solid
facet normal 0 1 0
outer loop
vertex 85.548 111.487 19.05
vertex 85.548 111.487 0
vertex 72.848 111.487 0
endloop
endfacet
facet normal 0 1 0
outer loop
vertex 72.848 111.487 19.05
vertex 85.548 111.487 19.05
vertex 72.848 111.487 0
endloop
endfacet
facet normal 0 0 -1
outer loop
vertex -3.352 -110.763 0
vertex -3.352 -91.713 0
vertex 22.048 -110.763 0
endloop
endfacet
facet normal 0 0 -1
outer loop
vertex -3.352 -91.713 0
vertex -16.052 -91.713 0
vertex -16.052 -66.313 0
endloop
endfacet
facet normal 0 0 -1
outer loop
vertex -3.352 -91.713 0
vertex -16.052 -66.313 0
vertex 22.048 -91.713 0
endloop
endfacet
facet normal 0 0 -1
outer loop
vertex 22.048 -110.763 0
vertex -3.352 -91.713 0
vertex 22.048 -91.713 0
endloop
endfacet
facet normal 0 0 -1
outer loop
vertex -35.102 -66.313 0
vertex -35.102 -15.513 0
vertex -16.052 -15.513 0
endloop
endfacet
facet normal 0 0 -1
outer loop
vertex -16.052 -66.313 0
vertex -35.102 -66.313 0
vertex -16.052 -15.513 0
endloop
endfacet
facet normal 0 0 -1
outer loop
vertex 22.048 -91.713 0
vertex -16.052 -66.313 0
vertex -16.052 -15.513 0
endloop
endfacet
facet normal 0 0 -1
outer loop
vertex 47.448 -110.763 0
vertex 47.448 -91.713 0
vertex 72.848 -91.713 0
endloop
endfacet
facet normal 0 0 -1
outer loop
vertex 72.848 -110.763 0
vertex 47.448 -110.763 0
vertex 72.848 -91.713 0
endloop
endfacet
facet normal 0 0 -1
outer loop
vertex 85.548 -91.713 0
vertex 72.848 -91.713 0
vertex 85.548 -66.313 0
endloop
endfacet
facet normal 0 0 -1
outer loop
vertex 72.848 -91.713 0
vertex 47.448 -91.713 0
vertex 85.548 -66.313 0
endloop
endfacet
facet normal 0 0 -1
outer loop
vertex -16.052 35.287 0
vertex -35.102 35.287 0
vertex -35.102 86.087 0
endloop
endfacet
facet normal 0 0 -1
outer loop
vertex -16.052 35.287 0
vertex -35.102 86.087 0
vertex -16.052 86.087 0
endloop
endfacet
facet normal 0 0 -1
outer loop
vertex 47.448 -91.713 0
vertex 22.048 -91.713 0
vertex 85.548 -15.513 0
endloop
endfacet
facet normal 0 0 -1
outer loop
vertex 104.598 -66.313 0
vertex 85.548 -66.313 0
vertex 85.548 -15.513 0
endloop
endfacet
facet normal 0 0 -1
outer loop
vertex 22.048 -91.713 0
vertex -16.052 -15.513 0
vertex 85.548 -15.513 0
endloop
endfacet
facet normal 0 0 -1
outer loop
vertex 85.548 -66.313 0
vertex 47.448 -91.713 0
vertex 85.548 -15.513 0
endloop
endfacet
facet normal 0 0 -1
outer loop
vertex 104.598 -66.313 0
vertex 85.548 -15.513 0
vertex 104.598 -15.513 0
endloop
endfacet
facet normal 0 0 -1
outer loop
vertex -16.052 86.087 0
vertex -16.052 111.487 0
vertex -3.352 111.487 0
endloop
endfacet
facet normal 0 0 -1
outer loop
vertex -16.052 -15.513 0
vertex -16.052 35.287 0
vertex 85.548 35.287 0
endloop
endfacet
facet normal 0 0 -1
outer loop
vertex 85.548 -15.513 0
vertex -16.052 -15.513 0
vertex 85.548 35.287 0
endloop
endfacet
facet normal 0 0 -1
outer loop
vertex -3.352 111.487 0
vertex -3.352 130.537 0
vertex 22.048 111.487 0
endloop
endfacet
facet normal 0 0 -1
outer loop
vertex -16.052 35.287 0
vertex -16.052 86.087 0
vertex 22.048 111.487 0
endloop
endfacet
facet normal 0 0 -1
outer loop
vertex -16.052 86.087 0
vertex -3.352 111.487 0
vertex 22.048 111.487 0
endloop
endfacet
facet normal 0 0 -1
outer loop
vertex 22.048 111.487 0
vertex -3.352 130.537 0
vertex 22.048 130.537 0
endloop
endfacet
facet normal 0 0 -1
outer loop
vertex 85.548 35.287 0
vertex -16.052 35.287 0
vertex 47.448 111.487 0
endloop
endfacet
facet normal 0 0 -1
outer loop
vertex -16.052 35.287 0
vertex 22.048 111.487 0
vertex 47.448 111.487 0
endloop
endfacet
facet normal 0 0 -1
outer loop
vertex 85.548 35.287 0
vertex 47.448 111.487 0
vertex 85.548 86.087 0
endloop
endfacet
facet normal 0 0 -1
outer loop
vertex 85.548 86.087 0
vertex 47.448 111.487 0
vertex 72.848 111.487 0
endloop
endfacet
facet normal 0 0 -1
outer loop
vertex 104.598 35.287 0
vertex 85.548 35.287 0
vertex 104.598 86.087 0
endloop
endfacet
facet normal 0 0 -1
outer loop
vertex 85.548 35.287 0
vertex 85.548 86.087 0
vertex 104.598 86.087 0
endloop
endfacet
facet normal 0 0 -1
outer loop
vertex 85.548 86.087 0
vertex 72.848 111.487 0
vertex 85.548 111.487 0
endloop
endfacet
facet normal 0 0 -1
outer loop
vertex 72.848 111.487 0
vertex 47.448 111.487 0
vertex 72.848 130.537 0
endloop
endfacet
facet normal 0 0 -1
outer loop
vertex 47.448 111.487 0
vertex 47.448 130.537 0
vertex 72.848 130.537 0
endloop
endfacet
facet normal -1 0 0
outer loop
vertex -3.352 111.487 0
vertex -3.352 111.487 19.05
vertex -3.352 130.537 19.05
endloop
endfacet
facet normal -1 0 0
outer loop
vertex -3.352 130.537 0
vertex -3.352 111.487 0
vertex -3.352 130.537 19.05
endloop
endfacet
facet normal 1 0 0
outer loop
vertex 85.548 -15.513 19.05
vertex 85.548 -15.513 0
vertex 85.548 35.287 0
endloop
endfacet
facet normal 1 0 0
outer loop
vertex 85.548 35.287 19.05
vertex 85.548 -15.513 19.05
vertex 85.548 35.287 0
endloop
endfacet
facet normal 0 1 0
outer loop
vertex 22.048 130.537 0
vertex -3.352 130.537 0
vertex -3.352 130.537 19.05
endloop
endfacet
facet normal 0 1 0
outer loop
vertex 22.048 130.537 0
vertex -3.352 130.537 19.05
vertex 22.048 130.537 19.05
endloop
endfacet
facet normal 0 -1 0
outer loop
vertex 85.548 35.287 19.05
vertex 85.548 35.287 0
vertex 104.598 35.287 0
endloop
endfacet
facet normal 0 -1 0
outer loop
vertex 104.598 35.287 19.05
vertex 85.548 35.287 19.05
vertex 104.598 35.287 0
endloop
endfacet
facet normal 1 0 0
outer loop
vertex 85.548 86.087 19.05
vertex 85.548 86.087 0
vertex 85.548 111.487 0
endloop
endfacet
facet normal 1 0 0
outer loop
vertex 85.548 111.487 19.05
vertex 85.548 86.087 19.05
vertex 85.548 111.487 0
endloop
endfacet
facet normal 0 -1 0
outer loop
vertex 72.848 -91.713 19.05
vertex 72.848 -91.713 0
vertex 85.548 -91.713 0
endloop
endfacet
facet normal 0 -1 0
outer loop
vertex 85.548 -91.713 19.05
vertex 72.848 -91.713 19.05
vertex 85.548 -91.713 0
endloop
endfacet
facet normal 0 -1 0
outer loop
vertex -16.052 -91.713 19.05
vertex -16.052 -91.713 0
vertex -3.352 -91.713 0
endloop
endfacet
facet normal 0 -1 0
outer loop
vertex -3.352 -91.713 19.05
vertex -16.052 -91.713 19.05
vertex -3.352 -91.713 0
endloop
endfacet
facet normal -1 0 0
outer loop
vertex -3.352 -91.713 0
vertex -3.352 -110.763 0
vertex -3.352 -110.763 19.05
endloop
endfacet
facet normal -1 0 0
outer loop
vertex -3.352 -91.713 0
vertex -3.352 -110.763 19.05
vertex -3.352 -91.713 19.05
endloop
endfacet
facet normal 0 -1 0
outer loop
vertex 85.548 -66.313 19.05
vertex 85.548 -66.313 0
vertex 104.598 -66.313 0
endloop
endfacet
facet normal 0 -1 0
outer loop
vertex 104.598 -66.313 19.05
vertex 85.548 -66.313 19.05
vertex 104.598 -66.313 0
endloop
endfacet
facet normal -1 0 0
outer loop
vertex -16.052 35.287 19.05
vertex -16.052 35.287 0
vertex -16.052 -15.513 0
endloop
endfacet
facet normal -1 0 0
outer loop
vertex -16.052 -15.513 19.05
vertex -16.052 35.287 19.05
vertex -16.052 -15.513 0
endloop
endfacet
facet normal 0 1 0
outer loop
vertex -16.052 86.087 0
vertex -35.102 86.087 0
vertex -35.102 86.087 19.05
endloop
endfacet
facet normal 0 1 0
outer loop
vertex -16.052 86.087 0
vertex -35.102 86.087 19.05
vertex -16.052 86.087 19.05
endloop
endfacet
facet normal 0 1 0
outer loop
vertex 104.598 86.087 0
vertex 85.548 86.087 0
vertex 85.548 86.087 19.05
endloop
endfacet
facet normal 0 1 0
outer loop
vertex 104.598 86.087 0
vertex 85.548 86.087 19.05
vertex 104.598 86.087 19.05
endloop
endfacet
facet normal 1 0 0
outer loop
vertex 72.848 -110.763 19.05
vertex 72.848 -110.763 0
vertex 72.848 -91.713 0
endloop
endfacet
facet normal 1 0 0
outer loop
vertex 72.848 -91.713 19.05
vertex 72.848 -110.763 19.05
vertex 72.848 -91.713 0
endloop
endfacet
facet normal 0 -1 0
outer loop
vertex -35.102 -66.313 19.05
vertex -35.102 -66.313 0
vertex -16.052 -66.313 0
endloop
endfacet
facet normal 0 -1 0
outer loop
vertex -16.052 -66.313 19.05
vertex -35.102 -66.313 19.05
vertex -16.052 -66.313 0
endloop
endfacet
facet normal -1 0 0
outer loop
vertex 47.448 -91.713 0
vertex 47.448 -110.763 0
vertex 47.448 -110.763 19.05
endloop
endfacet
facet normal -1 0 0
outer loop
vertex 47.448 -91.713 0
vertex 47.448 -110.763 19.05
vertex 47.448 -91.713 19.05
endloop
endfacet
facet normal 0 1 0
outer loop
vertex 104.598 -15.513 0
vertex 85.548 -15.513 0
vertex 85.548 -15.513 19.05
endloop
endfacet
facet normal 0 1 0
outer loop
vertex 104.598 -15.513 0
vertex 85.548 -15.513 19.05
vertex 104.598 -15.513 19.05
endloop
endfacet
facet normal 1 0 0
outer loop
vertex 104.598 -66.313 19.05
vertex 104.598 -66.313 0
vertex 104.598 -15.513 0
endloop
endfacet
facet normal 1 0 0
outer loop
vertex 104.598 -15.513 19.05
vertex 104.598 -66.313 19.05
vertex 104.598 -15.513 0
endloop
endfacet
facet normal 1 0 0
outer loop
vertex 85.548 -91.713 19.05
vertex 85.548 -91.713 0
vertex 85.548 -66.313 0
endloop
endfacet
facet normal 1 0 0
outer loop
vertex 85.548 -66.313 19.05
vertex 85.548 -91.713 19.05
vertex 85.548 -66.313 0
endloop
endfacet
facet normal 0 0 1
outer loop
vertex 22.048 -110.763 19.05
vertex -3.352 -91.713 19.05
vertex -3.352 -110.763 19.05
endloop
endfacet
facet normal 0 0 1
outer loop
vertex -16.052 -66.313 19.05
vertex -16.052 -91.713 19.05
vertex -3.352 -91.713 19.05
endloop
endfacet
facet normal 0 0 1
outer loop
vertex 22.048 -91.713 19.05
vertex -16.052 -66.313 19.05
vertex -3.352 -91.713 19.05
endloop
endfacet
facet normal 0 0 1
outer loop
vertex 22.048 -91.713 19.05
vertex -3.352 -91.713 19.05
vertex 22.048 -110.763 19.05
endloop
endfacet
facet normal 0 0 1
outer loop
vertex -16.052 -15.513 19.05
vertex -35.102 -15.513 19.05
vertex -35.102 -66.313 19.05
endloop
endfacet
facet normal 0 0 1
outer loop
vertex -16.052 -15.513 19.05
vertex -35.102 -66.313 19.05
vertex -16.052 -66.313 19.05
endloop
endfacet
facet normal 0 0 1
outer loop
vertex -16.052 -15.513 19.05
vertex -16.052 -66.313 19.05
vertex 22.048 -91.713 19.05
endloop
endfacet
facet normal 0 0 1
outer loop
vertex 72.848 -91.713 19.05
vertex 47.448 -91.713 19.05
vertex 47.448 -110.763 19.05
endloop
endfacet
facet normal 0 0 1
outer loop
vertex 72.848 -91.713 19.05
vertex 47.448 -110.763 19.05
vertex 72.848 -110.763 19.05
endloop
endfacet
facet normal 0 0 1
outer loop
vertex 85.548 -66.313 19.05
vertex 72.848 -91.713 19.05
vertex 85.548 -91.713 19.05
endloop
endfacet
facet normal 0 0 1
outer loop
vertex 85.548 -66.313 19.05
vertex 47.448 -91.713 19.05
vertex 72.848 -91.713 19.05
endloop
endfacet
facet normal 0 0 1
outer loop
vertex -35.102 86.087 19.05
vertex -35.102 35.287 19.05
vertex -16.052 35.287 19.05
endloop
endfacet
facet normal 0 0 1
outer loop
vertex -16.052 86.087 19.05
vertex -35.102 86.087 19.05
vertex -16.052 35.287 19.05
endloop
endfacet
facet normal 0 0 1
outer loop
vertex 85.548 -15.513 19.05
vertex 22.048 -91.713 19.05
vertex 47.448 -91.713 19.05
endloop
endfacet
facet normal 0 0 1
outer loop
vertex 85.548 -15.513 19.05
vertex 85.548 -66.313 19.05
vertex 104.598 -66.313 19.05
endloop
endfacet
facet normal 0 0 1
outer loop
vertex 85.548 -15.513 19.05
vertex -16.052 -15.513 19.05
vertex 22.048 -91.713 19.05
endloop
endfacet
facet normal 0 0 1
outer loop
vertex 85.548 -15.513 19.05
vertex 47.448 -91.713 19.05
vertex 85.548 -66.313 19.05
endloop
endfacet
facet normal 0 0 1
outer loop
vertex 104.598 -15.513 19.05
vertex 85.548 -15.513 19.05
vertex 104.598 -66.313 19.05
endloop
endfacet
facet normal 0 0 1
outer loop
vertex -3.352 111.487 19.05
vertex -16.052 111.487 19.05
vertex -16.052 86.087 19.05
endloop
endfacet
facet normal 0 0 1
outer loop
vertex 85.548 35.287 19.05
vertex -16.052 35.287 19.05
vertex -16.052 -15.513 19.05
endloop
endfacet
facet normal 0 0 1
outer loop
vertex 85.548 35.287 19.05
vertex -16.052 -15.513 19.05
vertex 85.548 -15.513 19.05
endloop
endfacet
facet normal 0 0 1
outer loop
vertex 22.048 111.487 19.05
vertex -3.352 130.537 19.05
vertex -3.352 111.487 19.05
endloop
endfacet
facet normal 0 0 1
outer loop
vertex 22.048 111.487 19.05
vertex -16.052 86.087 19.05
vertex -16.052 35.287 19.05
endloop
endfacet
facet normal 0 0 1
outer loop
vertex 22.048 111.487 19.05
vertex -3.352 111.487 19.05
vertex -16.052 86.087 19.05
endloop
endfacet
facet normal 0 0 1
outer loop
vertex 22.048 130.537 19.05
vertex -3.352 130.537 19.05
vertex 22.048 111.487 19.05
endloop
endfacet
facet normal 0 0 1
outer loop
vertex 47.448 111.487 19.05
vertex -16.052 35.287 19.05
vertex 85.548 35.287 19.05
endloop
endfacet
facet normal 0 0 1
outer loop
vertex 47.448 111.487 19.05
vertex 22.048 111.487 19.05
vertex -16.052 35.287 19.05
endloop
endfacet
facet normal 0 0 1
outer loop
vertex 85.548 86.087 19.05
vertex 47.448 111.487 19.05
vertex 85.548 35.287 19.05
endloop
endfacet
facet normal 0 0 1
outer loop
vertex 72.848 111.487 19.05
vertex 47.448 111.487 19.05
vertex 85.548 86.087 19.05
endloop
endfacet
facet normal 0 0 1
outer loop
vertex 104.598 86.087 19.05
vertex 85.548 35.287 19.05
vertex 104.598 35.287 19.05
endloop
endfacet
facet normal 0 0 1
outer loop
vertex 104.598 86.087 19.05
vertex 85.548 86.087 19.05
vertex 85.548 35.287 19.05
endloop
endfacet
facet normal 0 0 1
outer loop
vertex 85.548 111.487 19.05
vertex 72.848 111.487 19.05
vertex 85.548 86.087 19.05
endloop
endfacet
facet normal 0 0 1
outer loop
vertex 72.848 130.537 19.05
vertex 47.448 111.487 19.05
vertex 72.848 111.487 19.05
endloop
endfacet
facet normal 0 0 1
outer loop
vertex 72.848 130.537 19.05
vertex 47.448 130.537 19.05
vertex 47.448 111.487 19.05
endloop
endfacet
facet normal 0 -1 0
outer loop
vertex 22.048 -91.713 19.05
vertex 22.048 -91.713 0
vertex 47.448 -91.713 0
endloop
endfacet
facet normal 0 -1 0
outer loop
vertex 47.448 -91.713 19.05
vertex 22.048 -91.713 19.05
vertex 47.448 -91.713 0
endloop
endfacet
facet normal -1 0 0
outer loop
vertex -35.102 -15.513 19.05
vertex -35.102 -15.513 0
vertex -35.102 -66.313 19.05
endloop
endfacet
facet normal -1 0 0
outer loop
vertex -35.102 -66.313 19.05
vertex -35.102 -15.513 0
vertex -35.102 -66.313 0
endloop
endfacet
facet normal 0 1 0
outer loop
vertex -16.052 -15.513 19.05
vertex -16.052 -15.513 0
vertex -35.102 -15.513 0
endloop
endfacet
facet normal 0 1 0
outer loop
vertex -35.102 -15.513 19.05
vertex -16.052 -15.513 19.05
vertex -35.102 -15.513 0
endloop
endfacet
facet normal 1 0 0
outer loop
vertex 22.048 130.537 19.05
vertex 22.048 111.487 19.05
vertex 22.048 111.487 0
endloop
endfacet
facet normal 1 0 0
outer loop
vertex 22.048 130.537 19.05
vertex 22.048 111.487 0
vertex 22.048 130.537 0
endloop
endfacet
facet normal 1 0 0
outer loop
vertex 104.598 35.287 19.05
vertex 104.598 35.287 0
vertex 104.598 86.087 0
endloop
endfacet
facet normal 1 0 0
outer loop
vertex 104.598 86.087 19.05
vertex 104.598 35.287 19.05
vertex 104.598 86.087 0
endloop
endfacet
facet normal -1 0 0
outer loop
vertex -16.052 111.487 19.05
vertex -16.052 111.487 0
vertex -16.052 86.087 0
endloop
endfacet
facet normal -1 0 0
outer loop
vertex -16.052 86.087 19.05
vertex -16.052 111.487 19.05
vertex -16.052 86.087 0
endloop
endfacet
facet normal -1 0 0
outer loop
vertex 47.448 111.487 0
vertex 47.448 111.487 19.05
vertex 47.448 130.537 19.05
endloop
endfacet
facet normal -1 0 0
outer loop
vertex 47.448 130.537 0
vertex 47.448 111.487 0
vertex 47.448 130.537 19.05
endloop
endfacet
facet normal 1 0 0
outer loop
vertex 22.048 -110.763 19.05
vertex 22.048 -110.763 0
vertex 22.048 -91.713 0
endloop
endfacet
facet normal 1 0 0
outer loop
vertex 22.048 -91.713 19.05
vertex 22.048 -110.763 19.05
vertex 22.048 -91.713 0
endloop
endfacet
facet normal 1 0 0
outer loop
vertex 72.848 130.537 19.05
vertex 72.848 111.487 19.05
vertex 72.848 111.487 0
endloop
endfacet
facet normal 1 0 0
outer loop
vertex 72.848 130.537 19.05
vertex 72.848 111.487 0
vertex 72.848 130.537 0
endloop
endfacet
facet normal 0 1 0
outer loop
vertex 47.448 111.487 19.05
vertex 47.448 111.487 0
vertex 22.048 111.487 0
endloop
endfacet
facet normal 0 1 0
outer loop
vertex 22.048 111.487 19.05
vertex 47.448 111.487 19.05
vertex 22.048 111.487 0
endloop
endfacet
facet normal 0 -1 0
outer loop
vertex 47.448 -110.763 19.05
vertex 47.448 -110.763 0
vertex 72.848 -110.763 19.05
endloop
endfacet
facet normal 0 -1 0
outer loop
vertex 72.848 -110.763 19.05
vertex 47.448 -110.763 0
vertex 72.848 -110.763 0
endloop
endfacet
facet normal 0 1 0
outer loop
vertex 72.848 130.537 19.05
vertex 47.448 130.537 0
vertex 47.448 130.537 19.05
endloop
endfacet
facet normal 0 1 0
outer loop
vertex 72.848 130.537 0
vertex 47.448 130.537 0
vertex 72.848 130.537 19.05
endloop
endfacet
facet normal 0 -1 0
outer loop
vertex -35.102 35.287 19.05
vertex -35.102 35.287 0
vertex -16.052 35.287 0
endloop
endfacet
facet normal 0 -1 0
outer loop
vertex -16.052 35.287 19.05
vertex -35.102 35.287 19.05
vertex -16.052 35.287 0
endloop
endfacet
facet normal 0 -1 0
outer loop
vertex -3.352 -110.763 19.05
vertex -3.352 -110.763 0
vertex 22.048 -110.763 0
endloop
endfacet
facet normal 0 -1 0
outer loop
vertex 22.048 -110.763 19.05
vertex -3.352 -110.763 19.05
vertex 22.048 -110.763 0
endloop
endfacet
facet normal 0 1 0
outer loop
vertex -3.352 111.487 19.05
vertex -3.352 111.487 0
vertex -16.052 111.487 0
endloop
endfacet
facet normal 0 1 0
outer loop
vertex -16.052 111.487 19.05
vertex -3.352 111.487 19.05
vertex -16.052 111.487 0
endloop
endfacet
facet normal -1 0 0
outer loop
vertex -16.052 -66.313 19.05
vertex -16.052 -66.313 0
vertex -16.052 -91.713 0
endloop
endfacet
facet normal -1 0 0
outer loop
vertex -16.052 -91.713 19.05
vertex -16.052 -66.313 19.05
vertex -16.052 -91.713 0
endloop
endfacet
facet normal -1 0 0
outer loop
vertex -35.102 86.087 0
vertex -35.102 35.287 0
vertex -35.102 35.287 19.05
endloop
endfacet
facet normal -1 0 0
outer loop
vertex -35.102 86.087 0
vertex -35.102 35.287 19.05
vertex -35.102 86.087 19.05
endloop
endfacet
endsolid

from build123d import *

# Parameters (mm, degrees)
F0_W     = 19.05
F0_H     = 50.8
F0_W_2   = 25.4
F0_H_2   = 19.05
F1_DEPTH = 19.05


# Not quite as in the source:
# - a feature names something its author has since deleted; it is built from what else it names


with BuildPart() as f1:
    # F0 (on Top) → F1 (new body)
    with BuildSketch(Plane.XY):
        with Locations((-25.5773371266, 60.6874149844)):
            Rectangle(F0_W, F0_H)
        Polygon((-3.3523371266, 111.4874149844), (-16.0523371266, 111.4874149844), (-16.0523371266, 86.0874149844), (-16.0523371266, 35.2874149844), (-16.0523371266, -15.5125850156), (-16.0523371266, -32.8271351755), (-16.0523371266, -66.3125850156), (-16.0523371266, -91.7125850156), (-3.3523371266, -91.7125850156), (22.0476628734, -91.7125850156), (47.4476628734, -91.7125850156), (72.8476628734, -91.7125850156), (85.5476628734, -91.7125850156), (85.5476628734, -66.3125850156), (85.5476628734, -15.5125850156), (85.5476628734, 35.2874149844), (85.5476628734, 86.0874149844), (85.5476628734, 111.4874149844), (72.8476628734, 111.4874149844), (47.4476628734, 111.4874149844), (22.0476628734, 111.4874149844), align=None)
        Polygon((-16.0523371266, -32.8271351755), (-16.0523371266, -15.5125850156), (-35.1023371266, -15.5125850156), (-35.1023371266, -66.3125850156), (-16.0523371266, -66.3125850156), align=None)
        with Locations((9.3476628734, -101.2375850156)):
            Rectangle(F0_W_2, F0_H_2)
        with Locations((60.1476628734, -101.2375850156)):
            Rectangle(F0_W_2, F0_H_2)
        with Locations((95.0726628734, -40.9125850156)):
            Rectangle(F0_W, F0_H)
        with Locations((95.0726628734, 60.6874149844)):
            Rectangle(F0_W, F0_H)
        with Locations((60.1476628734, 121.0124149844)):
            Rectangle(F0_W_2, F0_H_2)
        with Locations((9.3476628734, 121.0124149844)):
            Rectangle(F0_W_2, F0_H_2)
    extrude(amount=F1_DEPTH)


solid = f1.part
